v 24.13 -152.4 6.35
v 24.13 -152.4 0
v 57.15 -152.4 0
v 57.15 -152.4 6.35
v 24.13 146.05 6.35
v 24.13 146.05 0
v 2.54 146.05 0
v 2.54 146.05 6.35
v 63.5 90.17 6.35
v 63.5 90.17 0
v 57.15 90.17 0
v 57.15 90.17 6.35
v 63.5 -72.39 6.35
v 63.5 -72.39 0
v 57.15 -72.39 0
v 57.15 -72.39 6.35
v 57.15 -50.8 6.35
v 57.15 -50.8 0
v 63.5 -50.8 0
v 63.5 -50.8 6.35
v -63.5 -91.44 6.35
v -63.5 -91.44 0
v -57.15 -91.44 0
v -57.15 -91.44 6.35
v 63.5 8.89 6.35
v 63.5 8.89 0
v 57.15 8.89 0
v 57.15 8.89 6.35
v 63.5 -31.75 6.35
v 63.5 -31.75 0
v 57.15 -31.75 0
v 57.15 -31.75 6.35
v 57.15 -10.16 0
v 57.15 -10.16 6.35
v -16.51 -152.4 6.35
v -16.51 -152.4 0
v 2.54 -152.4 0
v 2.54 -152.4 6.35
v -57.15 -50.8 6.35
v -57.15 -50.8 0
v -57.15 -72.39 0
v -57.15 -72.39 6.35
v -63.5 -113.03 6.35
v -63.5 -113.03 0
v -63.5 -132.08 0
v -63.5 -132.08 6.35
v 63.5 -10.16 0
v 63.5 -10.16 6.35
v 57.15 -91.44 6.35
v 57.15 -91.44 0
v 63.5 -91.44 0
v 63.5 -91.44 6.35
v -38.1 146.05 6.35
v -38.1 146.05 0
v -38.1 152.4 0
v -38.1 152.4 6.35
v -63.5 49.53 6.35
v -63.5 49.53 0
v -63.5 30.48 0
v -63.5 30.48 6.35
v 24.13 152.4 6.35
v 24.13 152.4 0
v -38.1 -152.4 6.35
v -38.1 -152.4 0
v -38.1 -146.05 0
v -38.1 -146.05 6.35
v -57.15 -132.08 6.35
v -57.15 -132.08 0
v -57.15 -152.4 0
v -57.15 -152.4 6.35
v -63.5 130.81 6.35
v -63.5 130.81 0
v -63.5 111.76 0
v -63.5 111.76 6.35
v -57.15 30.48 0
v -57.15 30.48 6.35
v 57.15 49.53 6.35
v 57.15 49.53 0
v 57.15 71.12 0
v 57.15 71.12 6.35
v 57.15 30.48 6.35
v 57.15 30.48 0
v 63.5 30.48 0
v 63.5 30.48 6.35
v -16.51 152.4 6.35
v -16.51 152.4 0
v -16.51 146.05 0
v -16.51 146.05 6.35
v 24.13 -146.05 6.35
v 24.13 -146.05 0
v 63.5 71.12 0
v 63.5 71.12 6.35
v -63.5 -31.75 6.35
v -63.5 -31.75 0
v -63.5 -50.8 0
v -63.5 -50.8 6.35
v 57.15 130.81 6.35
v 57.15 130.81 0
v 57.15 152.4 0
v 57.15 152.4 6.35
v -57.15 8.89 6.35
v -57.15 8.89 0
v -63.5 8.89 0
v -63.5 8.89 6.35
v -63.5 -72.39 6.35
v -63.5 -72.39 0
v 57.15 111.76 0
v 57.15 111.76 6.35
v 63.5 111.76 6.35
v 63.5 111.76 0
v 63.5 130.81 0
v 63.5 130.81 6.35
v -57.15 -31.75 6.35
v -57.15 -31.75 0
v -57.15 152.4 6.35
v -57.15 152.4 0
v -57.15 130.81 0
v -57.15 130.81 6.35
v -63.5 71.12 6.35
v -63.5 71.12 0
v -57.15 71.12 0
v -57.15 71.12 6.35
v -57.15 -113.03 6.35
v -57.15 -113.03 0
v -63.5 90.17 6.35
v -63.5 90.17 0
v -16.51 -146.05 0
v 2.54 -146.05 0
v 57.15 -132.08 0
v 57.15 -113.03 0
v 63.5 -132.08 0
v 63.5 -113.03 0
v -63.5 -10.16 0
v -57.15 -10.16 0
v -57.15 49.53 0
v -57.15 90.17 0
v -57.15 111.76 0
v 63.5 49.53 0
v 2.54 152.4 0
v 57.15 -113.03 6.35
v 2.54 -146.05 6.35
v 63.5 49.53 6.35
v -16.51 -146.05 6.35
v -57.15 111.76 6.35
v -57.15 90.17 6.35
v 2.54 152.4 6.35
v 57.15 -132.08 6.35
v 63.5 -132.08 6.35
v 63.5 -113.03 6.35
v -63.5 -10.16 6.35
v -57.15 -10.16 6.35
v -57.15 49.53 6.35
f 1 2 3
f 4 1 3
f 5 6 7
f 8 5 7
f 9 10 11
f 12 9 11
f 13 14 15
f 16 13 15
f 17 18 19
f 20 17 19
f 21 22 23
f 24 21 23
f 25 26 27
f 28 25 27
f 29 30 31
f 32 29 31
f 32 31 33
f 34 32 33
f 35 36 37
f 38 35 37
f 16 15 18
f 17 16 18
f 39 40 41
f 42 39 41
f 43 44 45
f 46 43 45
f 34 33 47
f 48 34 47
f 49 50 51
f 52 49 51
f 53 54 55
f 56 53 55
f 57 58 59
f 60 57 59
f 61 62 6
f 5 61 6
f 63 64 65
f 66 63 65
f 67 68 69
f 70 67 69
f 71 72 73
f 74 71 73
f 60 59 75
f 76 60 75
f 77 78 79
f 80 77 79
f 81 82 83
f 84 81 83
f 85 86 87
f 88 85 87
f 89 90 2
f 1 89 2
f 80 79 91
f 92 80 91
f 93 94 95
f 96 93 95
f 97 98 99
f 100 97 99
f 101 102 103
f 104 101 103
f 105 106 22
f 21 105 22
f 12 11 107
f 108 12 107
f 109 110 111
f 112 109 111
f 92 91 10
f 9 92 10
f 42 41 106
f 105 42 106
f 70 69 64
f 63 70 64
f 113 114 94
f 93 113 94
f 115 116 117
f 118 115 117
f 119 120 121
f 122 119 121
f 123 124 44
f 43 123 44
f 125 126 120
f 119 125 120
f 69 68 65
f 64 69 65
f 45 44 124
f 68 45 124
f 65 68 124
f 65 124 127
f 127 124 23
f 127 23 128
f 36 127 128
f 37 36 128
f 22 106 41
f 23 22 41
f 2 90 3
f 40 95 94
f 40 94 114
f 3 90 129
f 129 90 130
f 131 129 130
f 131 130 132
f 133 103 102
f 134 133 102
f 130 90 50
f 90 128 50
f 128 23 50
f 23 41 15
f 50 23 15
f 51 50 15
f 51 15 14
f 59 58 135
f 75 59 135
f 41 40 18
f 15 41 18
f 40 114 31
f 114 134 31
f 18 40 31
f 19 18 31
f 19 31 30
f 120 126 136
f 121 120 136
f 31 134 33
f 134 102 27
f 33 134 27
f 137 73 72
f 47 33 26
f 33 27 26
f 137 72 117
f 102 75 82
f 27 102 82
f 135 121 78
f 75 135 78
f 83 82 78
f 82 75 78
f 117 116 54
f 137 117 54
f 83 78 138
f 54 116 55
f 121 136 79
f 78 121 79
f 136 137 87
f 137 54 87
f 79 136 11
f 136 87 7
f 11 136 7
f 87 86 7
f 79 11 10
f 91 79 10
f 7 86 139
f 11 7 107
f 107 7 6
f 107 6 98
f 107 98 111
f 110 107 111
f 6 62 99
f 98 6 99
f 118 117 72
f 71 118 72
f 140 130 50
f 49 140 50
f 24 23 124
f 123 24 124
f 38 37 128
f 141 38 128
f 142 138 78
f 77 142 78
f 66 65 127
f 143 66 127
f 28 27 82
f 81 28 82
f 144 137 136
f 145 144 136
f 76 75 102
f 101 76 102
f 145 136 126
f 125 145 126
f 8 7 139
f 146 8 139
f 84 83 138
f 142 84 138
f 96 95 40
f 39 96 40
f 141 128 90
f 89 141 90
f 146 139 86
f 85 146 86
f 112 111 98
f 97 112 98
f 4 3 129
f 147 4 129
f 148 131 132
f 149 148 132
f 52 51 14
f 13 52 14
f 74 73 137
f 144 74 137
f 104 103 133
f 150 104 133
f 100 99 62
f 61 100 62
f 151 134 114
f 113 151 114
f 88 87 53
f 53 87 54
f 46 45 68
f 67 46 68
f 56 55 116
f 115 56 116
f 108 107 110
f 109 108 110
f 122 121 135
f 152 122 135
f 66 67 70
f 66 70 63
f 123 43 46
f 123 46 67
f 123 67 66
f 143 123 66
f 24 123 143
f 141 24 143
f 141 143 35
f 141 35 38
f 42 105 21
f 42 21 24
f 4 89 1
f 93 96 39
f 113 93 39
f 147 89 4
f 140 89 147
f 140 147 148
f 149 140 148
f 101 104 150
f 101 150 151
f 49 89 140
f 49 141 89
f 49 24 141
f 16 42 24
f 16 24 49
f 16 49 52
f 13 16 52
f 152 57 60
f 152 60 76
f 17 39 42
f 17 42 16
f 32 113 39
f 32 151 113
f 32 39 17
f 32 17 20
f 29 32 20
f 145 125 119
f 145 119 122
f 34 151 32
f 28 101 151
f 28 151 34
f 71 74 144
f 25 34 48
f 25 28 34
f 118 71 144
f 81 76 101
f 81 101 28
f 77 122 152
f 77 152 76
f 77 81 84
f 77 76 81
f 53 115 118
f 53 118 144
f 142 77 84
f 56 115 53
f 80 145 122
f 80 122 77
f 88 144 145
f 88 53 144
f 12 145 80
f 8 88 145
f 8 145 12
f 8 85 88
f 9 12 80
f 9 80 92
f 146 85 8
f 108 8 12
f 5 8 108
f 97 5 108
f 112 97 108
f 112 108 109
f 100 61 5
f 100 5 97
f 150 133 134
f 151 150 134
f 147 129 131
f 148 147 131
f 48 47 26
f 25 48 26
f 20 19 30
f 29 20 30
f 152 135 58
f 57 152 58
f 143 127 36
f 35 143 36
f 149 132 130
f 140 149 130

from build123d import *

# Parameters (mm, degrees)
F1_DEPTH = 6.35


with BuildPart() as f1:
    # F0 (on Top) → F1 (new body)
    with BuildSketch(Plane.XY):
        Polygon((57.15, 130.81), (57.15, 152.4), (24.13, 152.4), (24.13, 146.05), (2.54, 146.05), (2.54, 152.4), (-16.51, 152.4), (-16.51, 146.05), (-38.1, 146.05), (-38.1, 152.4), (-57.15, 152.4), (-57.15, 130.81), (-63.5, 130.81), (-63.5, 111.76), (-57.15, 111.76), (-57.15, 90.17), (-63.5, 90.17), (-63.5, 71.12), (-57.15, 71.12), (-57.15, 49.53), (-63.5, 49.53), (-63.5, 30.48), (-57.15, 30.48), (-57.15, 8.89), (-63.5, 8.89), (-63.5, -10.16), (-57.15, -10.16), (-57.15, -31.75), (-63.5, -31.75), (-63.5, -50.8), (-57.15, -50.8), (-57.15, -72.39), (-63.5, -72.39), (-63.5, -91.44), (-57.15, -91.44), (-57.15, -113.03), (-63.5, -113.03), (-63.5, -132.08), (-57.15, -132.08), (-57.15, -152.4), (-38.1, -152.4), (-38.1, -146.05), (-16.51, -146.05), (-16.51, -152.4), (2.54, -152.4), (2.54, -146.05), (24.13, -146.05), (24.13, -152.4), (43.18, -152.4), (57.15, -152.4), (57.15, -132.08), (63.5, -132.08), (63.5, -113.03), (57.15, -113.03), (57.15, -91.44), (63.5, -91.44), (63.5, -72.39), (57.15, -72.39), (57.15, -50.8), (63.5, -50.8), (63.5, -31.75), (57.15, -31.75), (57.15, -10.16), (63.5, -10.16), (63.5, 8.89), (57.15, 8.89), (57.15, 30.48), (63.5, 30.48), (63.5, 49.53), (57.15, 49.53), (57.15, 71.12), (63.5, 71.12), (63.5, 90.17), (57.15, 90.17), (57.15, 111.76), (63.5, 111.76), (63.5, 130.81), align=None)
    extrude(amount=F1_DEPTH)


solid = f1.part
